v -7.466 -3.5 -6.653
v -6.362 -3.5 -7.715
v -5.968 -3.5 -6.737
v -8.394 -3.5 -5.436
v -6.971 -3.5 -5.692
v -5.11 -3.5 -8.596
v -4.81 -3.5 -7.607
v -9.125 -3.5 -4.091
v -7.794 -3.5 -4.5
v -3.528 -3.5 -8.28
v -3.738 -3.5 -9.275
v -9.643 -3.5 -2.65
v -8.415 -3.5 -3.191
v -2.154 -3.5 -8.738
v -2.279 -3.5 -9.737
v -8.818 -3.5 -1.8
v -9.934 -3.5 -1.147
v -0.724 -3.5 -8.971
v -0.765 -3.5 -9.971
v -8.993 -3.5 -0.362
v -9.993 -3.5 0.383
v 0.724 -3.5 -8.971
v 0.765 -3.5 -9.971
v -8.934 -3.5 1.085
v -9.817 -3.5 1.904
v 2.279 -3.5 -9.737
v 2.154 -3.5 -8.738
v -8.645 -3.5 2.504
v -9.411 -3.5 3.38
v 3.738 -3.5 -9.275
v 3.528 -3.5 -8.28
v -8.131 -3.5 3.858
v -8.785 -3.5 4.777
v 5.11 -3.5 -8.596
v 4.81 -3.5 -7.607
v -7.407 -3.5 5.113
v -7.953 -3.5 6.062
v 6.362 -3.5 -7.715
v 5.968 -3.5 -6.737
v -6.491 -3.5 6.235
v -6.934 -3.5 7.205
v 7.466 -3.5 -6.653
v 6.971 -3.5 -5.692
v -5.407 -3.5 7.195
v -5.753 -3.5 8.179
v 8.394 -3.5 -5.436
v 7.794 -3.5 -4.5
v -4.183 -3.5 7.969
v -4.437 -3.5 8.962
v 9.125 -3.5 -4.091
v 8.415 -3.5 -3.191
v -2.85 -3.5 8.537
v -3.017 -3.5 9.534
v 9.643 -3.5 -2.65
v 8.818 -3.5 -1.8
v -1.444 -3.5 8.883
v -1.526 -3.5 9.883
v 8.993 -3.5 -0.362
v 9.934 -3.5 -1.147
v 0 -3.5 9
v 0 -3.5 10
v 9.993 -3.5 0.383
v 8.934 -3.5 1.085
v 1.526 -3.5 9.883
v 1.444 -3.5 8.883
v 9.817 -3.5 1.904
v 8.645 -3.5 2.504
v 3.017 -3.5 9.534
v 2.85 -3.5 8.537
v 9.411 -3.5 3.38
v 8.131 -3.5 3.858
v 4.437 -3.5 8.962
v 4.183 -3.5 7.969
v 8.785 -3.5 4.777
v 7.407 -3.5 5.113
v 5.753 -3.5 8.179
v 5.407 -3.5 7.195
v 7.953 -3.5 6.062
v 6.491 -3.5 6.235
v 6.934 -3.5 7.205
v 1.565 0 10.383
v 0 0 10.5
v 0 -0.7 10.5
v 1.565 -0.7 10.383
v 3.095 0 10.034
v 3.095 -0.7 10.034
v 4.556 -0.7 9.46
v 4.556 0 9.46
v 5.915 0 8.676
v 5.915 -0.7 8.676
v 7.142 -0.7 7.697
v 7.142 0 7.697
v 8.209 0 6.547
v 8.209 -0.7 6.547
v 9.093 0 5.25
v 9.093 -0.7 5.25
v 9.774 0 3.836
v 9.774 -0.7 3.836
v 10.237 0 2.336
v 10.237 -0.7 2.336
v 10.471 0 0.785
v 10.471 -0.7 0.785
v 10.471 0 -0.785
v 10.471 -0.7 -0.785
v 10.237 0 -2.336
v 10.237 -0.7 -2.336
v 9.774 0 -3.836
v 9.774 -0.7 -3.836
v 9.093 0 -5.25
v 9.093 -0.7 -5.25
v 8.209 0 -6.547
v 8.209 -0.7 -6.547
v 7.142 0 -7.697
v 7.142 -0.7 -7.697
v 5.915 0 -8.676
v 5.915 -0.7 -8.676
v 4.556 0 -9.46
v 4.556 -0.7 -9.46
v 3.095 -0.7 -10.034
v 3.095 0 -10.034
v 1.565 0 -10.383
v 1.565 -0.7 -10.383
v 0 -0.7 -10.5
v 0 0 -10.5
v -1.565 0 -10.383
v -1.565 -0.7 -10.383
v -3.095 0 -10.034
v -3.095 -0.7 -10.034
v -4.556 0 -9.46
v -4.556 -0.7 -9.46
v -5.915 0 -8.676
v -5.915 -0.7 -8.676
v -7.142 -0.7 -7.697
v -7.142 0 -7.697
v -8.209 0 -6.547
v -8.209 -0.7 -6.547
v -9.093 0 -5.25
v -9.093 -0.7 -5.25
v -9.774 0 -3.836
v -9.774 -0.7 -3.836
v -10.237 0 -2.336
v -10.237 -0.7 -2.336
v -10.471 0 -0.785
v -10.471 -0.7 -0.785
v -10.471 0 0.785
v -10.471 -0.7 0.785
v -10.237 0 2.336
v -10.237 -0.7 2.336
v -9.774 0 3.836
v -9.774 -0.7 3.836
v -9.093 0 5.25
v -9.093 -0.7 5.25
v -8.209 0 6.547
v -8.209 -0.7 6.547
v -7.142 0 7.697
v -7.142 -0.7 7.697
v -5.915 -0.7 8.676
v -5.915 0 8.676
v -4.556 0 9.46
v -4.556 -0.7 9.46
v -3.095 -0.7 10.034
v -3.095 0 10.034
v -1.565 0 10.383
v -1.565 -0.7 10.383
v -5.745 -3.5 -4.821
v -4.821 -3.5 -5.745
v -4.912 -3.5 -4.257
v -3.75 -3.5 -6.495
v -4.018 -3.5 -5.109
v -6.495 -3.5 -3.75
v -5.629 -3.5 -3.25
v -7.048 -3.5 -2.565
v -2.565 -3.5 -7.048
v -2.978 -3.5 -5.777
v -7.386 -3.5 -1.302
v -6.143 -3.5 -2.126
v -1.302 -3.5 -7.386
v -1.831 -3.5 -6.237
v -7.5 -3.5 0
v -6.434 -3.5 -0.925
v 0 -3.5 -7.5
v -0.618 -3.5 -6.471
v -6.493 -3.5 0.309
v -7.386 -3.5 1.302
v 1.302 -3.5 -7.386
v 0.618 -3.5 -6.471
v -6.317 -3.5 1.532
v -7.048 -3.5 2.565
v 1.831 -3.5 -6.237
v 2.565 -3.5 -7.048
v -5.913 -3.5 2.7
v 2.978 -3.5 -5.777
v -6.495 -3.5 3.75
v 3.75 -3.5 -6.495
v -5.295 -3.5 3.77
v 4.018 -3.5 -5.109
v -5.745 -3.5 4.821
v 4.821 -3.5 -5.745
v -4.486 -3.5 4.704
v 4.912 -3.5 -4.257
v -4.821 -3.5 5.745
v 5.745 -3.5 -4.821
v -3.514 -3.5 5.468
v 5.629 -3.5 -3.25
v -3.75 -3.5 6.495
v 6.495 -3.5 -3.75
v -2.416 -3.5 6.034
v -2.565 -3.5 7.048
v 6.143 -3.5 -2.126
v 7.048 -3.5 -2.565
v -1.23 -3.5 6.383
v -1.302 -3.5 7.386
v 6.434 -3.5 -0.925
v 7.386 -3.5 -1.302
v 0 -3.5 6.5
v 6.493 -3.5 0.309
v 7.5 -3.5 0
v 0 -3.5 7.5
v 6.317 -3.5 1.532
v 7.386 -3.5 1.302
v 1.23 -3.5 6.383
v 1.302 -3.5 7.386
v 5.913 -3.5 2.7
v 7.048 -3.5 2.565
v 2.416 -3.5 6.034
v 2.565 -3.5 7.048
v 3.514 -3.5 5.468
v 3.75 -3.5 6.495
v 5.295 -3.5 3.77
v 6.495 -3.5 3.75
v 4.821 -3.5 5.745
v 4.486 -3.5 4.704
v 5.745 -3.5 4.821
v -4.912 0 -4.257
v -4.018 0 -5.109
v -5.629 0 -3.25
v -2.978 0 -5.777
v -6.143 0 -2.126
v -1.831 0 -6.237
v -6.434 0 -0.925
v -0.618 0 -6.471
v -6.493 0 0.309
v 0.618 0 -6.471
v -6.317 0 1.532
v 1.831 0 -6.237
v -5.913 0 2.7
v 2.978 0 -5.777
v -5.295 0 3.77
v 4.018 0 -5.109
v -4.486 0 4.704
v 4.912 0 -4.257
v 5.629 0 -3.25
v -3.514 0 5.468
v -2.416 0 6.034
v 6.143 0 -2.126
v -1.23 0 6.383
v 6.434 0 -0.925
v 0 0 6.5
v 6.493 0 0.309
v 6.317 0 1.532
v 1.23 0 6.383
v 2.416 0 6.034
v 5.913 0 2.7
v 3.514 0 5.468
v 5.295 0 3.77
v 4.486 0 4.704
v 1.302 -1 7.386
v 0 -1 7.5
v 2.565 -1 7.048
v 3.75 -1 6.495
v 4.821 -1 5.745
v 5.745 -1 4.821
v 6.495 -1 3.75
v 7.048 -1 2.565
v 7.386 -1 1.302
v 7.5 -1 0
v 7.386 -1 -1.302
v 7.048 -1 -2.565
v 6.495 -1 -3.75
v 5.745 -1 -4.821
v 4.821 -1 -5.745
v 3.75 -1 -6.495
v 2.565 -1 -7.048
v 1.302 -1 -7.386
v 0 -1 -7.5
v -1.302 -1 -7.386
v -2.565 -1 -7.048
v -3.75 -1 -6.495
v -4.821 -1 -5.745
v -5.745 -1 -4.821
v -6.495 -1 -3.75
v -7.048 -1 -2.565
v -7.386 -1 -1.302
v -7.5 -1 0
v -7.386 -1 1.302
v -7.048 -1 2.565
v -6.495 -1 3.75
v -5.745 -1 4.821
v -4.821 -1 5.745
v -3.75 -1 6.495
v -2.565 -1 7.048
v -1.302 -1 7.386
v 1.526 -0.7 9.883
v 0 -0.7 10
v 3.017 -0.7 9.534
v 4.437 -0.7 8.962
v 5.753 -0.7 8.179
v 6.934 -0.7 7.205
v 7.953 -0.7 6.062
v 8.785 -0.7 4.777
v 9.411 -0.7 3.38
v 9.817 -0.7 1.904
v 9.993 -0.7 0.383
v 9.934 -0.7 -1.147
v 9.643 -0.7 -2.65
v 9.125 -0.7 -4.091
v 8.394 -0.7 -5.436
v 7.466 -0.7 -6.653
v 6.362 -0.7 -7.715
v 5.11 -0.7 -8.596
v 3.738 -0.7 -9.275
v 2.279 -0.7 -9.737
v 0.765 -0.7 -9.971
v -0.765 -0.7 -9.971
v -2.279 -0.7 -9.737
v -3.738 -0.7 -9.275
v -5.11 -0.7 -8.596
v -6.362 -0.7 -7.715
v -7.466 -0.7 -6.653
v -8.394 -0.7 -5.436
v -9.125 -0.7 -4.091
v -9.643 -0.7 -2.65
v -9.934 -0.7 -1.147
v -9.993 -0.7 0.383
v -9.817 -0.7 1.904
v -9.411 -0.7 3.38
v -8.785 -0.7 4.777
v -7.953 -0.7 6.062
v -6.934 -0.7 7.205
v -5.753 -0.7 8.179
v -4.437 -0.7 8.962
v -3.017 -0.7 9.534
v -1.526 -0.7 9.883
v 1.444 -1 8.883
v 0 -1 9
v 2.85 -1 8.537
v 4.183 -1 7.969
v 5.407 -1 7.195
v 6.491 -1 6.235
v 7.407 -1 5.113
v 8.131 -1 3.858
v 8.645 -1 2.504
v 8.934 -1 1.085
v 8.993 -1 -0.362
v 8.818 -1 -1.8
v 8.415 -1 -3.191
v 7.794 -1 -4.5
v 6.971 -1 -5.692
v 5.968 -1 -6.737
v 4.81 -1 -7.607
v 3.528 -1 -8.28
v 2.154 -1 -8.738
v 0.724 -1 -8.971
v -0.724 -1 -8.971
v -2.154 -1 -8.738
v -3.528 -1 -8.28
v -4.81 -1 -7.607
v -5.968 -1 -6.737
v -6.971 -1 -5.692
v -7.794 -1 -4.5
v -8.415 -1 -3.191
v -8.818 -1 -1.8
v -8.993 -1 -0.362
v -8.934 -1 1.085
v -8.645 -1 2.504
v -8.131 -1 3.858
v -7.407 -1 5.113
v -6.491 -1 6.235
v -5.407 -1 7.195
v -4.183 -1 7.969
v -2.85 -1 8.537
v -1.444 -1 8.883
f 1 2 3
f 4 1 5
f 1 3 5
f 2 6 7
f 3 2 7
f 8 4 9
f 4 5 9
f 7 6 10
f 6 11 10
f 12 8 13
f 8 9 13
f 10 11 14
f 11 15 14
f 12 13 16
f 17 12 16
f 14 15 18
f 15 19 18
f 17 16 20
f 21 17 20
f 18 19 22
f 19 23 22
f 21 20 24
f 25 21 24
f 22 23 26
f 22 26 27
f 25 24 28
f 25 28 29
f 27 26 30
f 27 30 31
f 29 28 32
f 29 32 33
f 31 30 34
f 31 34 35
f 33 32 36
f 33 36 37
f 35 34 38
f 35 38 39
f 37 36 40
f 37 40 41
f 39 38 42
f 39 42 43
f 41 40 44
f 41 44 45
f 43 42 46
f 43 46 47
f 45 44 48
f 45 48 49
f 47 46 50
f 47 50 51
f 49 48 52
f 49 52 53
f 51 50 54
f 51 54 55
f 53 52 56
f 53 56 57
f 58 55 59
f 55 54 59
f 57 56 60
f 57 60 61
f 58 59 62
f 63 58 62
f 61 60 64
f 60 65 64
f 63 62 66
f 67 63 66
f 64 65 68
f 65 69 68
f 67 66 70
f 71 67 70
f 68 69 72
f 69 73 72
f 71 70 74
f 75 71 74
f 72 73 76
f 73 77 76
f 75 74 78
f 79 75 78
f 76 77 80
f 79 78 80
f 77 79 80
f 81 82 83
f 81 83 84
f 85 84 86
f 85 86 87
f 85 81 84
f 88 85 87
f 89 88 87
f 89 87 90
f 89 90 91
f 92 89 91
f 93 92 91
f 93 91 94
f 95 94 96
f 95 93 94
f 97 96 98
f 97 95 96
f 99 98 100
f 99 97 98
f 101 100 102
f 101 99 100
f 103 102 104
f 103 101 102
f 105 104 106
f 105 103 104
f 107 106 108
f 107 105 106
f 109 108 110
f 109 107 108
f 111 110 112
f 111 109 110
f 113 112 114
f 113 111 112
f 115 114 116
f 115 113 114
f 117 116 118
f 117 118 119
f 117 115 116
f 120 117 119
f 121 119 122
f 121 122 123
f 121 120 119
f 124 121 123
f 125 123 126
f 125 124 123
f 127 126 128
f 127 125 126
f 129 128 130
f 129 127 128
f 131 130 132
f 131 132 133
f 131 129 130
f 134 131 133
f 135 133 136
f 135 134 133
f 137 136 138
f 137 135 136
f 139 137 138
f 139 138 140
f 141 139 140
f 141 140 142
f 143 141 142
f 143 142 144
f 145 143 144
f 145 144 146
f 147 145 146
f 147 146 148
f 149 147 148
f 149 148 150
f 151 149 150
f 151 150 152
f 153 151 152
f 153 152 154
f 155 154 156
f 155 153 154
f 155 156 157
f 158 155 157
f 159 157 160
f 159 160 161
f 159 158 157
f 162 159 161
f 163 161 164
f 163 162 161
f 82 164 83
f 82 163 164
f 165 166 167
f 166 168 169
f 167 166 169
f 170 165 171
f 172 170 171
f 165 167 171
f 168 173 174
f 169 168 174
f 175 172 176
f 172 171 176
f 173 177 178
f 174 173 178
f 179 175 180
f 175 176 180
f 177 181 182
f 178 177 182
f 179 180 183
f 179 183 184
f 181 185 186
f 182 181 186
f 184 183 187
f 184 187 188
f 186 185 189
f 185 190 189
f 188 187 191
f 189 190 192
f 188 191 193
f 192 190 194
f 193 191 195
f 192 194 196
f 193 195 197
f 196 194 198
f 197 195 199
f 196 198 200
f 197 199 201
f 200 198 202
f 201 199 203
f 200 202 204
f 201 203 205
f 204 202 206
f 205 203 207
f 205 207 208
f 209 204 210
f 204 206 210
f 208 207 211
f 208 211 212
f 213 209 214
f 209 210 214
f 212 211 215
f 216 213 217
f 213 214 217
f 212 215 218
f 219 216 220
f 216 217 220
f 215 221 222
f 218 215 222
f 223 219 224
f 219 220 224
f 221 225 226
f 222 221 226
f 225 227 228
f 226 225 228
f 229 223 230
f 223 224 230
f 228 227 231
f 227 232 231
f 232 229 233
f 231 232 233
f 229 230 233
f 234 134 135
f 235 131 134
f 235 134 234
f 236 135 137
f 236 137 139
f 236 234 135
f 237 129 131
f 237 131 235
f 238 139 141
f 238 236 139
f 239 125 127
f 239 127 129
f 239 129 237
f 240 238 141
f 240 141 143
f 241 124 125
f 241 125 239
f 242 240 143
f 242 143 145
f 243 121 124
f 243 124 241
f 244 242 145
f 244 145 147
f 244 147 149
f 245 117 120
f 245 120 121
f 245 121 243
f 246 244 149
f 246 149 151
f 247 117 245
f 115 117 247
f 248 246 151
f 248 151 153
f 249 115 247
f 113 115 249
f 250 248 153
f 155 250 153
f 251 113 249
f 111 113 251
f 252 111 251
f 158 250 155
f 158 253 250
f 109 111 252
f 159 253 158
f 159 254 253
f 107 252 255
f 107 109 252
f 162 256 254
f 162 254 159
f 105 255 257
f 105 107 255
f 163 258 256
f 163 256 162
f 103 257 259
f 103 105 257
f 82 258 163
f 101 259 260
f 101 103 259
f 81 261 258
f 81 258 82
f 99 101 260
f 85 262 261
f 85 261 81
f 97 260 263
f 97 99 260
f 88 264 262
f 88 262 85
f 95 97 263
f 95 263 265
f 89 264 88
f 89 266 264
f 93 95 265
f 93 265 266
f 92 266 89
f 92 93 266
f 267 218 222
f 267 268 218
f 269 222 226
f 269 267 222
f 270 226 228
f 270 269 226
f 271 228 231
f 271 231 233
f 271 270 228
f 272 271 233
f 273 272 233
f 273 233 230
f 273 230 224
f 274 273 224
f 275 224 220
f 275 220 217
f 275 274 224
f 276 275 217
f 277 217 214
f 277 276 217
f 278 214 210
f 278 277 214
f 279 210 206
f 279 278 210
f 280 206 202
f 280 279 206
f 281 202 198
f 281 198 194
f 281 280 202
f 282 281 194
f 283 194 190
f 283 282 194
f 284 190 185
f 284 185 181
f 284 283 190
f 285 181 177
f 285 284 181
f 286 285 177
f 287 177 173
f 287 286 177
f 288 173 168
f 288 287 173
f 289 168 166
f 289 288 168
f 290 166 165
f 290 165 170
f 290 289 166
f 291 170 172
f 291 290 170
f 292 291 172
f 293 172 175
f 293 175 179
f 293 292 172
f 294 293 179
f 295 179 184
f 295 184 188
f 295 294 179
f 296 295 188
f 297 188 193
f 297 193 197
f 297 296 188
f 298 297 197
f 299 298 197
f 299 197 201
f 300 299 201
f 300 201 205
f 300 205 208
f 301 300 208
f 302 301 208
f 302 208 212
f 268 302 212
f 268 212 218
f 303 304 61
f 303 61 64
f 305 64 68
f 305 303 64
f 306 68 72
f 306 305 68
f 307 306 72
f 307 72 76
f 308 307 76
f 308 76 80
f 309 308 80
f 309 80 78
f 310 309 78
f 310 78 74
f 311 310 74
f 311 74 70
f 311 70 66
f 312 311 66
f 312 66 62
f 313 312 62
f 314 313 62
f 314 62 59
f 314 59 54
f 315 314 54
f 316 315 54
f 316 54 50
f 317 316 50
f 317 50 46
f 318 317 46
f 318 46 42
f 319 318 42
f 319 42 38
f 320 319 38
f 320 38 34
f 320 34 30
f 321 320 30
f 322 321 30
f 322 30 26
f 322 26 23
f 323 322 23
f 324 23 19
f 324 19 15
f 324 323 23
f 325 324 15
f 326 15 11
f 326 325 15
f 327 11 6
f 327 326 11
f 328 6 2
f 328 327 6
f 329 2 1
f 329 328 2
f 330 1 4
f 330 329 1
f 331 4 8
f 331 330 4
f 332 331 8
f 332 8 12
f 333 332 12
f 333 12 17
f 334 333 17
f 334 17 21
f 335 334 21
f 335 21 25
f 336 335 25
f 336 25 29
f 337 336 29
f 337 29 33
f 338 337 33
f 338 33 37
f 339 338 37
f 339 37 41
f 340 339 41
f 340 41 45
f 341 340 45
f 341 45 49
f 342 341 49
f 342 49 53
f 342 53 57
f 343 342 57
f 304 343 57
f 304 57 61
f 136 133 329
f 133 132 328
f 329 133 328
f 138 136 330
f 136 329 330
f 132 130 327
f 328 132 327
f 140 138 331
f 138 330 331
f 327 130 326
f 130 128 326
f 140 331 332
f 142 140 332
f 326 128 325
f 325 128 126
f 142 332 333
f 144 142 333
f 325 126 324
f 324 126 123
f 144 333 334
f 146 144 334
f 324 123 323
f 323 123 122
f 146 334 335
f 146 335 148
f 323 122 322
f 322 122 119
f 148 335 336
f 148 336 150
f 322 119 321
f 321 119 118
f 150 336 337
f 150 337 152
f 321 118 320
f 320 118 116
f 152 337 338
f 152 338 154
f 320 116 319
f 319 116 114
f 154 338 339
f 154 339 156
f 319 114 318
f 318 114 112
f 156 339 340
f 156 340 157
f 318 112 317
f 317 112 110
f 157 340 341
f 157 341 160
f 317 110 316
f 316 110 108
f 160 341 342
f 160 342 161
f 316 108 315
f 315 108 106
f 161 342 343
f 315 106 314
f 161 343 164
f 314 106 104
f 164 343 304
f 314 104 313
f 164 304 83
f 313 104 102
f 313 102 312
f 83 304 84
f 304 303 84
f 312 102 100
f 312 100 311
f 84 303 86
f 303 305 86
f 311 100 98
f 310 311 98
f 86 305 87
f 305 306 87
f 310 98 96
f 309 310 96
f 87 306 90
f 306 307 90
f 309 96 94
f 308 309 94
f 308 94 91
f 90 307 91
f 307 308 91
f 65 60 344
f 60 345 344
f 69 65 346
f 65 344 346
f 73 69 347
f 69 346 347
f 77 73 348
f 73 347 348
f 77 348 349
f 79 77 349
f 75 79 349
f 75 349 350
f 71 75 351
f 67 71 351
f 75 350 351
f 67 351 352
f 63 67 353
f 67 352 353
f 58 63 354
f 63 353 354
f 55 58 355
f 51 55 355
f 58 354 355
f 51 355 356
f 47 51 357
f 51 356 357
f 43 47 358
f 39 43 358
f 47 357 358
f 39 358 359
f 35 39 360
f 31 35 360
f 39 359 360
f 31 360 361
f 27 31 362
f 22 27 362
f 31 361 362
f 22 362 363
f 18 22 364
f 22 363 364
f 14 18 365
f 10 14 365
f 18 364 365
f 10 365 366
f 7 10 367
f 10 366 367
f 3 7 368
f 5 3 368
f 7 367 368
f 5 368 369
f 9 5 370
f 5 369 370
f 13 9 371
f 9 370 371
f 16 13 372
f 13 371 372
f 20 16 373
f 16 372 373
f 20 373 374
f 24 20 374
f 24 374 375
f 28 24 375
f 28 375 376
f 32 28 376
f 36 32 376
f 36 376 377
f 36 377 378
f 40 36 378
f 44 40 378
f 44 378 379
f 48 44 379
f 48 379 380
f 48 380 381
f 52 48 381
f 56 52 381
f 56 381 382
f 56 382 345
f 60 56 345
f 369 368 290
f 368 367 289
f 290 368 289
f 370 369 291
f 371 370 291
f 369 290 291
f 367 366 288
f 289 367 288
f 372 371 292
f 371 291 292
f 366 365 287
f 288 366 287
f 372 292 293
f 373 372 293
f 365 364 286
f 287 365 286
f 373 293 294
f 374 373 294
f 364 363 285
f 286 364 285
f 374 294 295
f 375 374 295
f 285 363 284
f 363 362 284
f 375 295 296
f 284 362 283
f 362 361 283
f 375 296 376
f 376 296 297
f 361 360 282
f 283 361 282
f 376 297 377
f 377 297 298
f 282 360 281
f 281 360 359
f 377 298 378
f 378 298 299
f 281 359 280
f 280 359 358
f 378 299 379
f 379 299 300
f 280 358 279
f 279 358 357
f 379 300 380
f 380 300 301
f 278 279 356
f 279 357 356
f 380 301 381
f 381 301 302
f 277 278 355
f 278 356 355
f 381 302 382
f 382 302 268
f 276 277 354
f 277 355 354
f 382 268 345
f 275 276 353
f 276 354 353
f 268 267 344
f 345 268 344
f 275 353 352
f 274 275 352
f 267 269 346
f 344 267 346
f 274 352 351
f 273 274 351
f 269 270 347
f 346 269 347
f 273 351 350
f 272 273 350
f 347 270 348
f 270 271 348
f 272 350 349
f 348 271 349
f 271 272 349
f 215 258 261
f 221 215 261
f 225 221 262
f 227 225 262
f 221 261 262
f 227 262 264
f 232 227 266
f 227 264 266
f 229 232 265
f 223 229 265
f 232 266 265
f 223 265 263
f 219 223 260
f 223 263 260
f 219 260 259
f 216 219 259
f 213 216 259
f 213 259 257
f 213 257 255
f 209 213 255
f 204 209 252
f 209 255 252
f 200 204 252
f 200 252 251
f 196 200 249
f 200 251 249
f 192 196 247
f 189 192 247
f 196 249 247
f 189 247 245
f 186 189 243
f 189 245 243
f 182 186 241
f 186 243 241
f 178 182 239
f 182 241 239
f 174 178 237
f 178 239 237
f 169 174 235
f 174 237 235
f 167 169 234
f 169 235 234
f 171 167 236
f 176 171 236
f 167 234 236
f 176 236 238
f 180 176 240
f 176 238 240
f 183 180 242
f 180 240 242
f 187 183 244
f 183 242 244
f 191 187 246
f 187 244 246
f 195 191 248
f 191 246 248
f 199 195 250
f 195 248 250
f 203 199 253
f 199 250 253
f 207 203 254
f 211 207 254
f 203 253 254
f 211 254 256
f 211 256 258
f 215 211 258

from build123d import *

# Parameters (mm, degrees)
ESQUISSE1_R      = 10
ESQUISSE1_R_2    = 6.5
EXTRUSION1_DEPTH = 3.5
ESQUISSE2_R      = 10.5
ESQUISSE2_R_2    = 10
EXTRUSION2_DEPTH = 0.7
COQUE1_T         = -1


with BuildPart() as part:
    # Esquisse1 → Extrusion1 (new body)
    with BuildSketch(Plane(origin=(0, 0, 0), x_dir=(1, 0, 0), z_dir=(0, 1, 0))):
        with Locations(Location((0, 0, 0), (0, 0, 270))):  # turned: the seam where the file's is
            Circle(ESQUISSE1_R)
        with Locations(Location((0, 0, 0), (0, 0, 270))):  # turned: the seam where the file's is
            Circle(ESQUISSE1_R_2, mode=Mode.SUBTRACT)
    extrude(amount=-EXTRUSION1_DEPTH)

    # Esquisse2 → Extrusion2 (add)
    with BuildSketch(Plane(origin=(0, 0, 0), x_dir=(-1, 0, 0), z_dir=(0, 1, 0))):
        with Locations(Location((0, 0, 0), (0, 0, 90))):  # turned: the seam where the file's is
            Circle(ESQUISSE2_R)
        with Locations(Location((0, 0, 0), (0, 0, 90))):  # turned: the seam where the file's is
            Circle(ESQUISSE2_R_2, mode=Mode.SUBTRACT)
    extrude(amount=-EXTRUSION2_DEPTH)

    # Coque1
    coque1_openings = [part.faces().sort_by_distance(p)[0] for p in [
        (0, -3.5, -9.717157288),
    ]]
    offset(amount=COQUE1_T, openings=coque1_openings, kind=Kind.INTERSECTION)


solid = part.part
